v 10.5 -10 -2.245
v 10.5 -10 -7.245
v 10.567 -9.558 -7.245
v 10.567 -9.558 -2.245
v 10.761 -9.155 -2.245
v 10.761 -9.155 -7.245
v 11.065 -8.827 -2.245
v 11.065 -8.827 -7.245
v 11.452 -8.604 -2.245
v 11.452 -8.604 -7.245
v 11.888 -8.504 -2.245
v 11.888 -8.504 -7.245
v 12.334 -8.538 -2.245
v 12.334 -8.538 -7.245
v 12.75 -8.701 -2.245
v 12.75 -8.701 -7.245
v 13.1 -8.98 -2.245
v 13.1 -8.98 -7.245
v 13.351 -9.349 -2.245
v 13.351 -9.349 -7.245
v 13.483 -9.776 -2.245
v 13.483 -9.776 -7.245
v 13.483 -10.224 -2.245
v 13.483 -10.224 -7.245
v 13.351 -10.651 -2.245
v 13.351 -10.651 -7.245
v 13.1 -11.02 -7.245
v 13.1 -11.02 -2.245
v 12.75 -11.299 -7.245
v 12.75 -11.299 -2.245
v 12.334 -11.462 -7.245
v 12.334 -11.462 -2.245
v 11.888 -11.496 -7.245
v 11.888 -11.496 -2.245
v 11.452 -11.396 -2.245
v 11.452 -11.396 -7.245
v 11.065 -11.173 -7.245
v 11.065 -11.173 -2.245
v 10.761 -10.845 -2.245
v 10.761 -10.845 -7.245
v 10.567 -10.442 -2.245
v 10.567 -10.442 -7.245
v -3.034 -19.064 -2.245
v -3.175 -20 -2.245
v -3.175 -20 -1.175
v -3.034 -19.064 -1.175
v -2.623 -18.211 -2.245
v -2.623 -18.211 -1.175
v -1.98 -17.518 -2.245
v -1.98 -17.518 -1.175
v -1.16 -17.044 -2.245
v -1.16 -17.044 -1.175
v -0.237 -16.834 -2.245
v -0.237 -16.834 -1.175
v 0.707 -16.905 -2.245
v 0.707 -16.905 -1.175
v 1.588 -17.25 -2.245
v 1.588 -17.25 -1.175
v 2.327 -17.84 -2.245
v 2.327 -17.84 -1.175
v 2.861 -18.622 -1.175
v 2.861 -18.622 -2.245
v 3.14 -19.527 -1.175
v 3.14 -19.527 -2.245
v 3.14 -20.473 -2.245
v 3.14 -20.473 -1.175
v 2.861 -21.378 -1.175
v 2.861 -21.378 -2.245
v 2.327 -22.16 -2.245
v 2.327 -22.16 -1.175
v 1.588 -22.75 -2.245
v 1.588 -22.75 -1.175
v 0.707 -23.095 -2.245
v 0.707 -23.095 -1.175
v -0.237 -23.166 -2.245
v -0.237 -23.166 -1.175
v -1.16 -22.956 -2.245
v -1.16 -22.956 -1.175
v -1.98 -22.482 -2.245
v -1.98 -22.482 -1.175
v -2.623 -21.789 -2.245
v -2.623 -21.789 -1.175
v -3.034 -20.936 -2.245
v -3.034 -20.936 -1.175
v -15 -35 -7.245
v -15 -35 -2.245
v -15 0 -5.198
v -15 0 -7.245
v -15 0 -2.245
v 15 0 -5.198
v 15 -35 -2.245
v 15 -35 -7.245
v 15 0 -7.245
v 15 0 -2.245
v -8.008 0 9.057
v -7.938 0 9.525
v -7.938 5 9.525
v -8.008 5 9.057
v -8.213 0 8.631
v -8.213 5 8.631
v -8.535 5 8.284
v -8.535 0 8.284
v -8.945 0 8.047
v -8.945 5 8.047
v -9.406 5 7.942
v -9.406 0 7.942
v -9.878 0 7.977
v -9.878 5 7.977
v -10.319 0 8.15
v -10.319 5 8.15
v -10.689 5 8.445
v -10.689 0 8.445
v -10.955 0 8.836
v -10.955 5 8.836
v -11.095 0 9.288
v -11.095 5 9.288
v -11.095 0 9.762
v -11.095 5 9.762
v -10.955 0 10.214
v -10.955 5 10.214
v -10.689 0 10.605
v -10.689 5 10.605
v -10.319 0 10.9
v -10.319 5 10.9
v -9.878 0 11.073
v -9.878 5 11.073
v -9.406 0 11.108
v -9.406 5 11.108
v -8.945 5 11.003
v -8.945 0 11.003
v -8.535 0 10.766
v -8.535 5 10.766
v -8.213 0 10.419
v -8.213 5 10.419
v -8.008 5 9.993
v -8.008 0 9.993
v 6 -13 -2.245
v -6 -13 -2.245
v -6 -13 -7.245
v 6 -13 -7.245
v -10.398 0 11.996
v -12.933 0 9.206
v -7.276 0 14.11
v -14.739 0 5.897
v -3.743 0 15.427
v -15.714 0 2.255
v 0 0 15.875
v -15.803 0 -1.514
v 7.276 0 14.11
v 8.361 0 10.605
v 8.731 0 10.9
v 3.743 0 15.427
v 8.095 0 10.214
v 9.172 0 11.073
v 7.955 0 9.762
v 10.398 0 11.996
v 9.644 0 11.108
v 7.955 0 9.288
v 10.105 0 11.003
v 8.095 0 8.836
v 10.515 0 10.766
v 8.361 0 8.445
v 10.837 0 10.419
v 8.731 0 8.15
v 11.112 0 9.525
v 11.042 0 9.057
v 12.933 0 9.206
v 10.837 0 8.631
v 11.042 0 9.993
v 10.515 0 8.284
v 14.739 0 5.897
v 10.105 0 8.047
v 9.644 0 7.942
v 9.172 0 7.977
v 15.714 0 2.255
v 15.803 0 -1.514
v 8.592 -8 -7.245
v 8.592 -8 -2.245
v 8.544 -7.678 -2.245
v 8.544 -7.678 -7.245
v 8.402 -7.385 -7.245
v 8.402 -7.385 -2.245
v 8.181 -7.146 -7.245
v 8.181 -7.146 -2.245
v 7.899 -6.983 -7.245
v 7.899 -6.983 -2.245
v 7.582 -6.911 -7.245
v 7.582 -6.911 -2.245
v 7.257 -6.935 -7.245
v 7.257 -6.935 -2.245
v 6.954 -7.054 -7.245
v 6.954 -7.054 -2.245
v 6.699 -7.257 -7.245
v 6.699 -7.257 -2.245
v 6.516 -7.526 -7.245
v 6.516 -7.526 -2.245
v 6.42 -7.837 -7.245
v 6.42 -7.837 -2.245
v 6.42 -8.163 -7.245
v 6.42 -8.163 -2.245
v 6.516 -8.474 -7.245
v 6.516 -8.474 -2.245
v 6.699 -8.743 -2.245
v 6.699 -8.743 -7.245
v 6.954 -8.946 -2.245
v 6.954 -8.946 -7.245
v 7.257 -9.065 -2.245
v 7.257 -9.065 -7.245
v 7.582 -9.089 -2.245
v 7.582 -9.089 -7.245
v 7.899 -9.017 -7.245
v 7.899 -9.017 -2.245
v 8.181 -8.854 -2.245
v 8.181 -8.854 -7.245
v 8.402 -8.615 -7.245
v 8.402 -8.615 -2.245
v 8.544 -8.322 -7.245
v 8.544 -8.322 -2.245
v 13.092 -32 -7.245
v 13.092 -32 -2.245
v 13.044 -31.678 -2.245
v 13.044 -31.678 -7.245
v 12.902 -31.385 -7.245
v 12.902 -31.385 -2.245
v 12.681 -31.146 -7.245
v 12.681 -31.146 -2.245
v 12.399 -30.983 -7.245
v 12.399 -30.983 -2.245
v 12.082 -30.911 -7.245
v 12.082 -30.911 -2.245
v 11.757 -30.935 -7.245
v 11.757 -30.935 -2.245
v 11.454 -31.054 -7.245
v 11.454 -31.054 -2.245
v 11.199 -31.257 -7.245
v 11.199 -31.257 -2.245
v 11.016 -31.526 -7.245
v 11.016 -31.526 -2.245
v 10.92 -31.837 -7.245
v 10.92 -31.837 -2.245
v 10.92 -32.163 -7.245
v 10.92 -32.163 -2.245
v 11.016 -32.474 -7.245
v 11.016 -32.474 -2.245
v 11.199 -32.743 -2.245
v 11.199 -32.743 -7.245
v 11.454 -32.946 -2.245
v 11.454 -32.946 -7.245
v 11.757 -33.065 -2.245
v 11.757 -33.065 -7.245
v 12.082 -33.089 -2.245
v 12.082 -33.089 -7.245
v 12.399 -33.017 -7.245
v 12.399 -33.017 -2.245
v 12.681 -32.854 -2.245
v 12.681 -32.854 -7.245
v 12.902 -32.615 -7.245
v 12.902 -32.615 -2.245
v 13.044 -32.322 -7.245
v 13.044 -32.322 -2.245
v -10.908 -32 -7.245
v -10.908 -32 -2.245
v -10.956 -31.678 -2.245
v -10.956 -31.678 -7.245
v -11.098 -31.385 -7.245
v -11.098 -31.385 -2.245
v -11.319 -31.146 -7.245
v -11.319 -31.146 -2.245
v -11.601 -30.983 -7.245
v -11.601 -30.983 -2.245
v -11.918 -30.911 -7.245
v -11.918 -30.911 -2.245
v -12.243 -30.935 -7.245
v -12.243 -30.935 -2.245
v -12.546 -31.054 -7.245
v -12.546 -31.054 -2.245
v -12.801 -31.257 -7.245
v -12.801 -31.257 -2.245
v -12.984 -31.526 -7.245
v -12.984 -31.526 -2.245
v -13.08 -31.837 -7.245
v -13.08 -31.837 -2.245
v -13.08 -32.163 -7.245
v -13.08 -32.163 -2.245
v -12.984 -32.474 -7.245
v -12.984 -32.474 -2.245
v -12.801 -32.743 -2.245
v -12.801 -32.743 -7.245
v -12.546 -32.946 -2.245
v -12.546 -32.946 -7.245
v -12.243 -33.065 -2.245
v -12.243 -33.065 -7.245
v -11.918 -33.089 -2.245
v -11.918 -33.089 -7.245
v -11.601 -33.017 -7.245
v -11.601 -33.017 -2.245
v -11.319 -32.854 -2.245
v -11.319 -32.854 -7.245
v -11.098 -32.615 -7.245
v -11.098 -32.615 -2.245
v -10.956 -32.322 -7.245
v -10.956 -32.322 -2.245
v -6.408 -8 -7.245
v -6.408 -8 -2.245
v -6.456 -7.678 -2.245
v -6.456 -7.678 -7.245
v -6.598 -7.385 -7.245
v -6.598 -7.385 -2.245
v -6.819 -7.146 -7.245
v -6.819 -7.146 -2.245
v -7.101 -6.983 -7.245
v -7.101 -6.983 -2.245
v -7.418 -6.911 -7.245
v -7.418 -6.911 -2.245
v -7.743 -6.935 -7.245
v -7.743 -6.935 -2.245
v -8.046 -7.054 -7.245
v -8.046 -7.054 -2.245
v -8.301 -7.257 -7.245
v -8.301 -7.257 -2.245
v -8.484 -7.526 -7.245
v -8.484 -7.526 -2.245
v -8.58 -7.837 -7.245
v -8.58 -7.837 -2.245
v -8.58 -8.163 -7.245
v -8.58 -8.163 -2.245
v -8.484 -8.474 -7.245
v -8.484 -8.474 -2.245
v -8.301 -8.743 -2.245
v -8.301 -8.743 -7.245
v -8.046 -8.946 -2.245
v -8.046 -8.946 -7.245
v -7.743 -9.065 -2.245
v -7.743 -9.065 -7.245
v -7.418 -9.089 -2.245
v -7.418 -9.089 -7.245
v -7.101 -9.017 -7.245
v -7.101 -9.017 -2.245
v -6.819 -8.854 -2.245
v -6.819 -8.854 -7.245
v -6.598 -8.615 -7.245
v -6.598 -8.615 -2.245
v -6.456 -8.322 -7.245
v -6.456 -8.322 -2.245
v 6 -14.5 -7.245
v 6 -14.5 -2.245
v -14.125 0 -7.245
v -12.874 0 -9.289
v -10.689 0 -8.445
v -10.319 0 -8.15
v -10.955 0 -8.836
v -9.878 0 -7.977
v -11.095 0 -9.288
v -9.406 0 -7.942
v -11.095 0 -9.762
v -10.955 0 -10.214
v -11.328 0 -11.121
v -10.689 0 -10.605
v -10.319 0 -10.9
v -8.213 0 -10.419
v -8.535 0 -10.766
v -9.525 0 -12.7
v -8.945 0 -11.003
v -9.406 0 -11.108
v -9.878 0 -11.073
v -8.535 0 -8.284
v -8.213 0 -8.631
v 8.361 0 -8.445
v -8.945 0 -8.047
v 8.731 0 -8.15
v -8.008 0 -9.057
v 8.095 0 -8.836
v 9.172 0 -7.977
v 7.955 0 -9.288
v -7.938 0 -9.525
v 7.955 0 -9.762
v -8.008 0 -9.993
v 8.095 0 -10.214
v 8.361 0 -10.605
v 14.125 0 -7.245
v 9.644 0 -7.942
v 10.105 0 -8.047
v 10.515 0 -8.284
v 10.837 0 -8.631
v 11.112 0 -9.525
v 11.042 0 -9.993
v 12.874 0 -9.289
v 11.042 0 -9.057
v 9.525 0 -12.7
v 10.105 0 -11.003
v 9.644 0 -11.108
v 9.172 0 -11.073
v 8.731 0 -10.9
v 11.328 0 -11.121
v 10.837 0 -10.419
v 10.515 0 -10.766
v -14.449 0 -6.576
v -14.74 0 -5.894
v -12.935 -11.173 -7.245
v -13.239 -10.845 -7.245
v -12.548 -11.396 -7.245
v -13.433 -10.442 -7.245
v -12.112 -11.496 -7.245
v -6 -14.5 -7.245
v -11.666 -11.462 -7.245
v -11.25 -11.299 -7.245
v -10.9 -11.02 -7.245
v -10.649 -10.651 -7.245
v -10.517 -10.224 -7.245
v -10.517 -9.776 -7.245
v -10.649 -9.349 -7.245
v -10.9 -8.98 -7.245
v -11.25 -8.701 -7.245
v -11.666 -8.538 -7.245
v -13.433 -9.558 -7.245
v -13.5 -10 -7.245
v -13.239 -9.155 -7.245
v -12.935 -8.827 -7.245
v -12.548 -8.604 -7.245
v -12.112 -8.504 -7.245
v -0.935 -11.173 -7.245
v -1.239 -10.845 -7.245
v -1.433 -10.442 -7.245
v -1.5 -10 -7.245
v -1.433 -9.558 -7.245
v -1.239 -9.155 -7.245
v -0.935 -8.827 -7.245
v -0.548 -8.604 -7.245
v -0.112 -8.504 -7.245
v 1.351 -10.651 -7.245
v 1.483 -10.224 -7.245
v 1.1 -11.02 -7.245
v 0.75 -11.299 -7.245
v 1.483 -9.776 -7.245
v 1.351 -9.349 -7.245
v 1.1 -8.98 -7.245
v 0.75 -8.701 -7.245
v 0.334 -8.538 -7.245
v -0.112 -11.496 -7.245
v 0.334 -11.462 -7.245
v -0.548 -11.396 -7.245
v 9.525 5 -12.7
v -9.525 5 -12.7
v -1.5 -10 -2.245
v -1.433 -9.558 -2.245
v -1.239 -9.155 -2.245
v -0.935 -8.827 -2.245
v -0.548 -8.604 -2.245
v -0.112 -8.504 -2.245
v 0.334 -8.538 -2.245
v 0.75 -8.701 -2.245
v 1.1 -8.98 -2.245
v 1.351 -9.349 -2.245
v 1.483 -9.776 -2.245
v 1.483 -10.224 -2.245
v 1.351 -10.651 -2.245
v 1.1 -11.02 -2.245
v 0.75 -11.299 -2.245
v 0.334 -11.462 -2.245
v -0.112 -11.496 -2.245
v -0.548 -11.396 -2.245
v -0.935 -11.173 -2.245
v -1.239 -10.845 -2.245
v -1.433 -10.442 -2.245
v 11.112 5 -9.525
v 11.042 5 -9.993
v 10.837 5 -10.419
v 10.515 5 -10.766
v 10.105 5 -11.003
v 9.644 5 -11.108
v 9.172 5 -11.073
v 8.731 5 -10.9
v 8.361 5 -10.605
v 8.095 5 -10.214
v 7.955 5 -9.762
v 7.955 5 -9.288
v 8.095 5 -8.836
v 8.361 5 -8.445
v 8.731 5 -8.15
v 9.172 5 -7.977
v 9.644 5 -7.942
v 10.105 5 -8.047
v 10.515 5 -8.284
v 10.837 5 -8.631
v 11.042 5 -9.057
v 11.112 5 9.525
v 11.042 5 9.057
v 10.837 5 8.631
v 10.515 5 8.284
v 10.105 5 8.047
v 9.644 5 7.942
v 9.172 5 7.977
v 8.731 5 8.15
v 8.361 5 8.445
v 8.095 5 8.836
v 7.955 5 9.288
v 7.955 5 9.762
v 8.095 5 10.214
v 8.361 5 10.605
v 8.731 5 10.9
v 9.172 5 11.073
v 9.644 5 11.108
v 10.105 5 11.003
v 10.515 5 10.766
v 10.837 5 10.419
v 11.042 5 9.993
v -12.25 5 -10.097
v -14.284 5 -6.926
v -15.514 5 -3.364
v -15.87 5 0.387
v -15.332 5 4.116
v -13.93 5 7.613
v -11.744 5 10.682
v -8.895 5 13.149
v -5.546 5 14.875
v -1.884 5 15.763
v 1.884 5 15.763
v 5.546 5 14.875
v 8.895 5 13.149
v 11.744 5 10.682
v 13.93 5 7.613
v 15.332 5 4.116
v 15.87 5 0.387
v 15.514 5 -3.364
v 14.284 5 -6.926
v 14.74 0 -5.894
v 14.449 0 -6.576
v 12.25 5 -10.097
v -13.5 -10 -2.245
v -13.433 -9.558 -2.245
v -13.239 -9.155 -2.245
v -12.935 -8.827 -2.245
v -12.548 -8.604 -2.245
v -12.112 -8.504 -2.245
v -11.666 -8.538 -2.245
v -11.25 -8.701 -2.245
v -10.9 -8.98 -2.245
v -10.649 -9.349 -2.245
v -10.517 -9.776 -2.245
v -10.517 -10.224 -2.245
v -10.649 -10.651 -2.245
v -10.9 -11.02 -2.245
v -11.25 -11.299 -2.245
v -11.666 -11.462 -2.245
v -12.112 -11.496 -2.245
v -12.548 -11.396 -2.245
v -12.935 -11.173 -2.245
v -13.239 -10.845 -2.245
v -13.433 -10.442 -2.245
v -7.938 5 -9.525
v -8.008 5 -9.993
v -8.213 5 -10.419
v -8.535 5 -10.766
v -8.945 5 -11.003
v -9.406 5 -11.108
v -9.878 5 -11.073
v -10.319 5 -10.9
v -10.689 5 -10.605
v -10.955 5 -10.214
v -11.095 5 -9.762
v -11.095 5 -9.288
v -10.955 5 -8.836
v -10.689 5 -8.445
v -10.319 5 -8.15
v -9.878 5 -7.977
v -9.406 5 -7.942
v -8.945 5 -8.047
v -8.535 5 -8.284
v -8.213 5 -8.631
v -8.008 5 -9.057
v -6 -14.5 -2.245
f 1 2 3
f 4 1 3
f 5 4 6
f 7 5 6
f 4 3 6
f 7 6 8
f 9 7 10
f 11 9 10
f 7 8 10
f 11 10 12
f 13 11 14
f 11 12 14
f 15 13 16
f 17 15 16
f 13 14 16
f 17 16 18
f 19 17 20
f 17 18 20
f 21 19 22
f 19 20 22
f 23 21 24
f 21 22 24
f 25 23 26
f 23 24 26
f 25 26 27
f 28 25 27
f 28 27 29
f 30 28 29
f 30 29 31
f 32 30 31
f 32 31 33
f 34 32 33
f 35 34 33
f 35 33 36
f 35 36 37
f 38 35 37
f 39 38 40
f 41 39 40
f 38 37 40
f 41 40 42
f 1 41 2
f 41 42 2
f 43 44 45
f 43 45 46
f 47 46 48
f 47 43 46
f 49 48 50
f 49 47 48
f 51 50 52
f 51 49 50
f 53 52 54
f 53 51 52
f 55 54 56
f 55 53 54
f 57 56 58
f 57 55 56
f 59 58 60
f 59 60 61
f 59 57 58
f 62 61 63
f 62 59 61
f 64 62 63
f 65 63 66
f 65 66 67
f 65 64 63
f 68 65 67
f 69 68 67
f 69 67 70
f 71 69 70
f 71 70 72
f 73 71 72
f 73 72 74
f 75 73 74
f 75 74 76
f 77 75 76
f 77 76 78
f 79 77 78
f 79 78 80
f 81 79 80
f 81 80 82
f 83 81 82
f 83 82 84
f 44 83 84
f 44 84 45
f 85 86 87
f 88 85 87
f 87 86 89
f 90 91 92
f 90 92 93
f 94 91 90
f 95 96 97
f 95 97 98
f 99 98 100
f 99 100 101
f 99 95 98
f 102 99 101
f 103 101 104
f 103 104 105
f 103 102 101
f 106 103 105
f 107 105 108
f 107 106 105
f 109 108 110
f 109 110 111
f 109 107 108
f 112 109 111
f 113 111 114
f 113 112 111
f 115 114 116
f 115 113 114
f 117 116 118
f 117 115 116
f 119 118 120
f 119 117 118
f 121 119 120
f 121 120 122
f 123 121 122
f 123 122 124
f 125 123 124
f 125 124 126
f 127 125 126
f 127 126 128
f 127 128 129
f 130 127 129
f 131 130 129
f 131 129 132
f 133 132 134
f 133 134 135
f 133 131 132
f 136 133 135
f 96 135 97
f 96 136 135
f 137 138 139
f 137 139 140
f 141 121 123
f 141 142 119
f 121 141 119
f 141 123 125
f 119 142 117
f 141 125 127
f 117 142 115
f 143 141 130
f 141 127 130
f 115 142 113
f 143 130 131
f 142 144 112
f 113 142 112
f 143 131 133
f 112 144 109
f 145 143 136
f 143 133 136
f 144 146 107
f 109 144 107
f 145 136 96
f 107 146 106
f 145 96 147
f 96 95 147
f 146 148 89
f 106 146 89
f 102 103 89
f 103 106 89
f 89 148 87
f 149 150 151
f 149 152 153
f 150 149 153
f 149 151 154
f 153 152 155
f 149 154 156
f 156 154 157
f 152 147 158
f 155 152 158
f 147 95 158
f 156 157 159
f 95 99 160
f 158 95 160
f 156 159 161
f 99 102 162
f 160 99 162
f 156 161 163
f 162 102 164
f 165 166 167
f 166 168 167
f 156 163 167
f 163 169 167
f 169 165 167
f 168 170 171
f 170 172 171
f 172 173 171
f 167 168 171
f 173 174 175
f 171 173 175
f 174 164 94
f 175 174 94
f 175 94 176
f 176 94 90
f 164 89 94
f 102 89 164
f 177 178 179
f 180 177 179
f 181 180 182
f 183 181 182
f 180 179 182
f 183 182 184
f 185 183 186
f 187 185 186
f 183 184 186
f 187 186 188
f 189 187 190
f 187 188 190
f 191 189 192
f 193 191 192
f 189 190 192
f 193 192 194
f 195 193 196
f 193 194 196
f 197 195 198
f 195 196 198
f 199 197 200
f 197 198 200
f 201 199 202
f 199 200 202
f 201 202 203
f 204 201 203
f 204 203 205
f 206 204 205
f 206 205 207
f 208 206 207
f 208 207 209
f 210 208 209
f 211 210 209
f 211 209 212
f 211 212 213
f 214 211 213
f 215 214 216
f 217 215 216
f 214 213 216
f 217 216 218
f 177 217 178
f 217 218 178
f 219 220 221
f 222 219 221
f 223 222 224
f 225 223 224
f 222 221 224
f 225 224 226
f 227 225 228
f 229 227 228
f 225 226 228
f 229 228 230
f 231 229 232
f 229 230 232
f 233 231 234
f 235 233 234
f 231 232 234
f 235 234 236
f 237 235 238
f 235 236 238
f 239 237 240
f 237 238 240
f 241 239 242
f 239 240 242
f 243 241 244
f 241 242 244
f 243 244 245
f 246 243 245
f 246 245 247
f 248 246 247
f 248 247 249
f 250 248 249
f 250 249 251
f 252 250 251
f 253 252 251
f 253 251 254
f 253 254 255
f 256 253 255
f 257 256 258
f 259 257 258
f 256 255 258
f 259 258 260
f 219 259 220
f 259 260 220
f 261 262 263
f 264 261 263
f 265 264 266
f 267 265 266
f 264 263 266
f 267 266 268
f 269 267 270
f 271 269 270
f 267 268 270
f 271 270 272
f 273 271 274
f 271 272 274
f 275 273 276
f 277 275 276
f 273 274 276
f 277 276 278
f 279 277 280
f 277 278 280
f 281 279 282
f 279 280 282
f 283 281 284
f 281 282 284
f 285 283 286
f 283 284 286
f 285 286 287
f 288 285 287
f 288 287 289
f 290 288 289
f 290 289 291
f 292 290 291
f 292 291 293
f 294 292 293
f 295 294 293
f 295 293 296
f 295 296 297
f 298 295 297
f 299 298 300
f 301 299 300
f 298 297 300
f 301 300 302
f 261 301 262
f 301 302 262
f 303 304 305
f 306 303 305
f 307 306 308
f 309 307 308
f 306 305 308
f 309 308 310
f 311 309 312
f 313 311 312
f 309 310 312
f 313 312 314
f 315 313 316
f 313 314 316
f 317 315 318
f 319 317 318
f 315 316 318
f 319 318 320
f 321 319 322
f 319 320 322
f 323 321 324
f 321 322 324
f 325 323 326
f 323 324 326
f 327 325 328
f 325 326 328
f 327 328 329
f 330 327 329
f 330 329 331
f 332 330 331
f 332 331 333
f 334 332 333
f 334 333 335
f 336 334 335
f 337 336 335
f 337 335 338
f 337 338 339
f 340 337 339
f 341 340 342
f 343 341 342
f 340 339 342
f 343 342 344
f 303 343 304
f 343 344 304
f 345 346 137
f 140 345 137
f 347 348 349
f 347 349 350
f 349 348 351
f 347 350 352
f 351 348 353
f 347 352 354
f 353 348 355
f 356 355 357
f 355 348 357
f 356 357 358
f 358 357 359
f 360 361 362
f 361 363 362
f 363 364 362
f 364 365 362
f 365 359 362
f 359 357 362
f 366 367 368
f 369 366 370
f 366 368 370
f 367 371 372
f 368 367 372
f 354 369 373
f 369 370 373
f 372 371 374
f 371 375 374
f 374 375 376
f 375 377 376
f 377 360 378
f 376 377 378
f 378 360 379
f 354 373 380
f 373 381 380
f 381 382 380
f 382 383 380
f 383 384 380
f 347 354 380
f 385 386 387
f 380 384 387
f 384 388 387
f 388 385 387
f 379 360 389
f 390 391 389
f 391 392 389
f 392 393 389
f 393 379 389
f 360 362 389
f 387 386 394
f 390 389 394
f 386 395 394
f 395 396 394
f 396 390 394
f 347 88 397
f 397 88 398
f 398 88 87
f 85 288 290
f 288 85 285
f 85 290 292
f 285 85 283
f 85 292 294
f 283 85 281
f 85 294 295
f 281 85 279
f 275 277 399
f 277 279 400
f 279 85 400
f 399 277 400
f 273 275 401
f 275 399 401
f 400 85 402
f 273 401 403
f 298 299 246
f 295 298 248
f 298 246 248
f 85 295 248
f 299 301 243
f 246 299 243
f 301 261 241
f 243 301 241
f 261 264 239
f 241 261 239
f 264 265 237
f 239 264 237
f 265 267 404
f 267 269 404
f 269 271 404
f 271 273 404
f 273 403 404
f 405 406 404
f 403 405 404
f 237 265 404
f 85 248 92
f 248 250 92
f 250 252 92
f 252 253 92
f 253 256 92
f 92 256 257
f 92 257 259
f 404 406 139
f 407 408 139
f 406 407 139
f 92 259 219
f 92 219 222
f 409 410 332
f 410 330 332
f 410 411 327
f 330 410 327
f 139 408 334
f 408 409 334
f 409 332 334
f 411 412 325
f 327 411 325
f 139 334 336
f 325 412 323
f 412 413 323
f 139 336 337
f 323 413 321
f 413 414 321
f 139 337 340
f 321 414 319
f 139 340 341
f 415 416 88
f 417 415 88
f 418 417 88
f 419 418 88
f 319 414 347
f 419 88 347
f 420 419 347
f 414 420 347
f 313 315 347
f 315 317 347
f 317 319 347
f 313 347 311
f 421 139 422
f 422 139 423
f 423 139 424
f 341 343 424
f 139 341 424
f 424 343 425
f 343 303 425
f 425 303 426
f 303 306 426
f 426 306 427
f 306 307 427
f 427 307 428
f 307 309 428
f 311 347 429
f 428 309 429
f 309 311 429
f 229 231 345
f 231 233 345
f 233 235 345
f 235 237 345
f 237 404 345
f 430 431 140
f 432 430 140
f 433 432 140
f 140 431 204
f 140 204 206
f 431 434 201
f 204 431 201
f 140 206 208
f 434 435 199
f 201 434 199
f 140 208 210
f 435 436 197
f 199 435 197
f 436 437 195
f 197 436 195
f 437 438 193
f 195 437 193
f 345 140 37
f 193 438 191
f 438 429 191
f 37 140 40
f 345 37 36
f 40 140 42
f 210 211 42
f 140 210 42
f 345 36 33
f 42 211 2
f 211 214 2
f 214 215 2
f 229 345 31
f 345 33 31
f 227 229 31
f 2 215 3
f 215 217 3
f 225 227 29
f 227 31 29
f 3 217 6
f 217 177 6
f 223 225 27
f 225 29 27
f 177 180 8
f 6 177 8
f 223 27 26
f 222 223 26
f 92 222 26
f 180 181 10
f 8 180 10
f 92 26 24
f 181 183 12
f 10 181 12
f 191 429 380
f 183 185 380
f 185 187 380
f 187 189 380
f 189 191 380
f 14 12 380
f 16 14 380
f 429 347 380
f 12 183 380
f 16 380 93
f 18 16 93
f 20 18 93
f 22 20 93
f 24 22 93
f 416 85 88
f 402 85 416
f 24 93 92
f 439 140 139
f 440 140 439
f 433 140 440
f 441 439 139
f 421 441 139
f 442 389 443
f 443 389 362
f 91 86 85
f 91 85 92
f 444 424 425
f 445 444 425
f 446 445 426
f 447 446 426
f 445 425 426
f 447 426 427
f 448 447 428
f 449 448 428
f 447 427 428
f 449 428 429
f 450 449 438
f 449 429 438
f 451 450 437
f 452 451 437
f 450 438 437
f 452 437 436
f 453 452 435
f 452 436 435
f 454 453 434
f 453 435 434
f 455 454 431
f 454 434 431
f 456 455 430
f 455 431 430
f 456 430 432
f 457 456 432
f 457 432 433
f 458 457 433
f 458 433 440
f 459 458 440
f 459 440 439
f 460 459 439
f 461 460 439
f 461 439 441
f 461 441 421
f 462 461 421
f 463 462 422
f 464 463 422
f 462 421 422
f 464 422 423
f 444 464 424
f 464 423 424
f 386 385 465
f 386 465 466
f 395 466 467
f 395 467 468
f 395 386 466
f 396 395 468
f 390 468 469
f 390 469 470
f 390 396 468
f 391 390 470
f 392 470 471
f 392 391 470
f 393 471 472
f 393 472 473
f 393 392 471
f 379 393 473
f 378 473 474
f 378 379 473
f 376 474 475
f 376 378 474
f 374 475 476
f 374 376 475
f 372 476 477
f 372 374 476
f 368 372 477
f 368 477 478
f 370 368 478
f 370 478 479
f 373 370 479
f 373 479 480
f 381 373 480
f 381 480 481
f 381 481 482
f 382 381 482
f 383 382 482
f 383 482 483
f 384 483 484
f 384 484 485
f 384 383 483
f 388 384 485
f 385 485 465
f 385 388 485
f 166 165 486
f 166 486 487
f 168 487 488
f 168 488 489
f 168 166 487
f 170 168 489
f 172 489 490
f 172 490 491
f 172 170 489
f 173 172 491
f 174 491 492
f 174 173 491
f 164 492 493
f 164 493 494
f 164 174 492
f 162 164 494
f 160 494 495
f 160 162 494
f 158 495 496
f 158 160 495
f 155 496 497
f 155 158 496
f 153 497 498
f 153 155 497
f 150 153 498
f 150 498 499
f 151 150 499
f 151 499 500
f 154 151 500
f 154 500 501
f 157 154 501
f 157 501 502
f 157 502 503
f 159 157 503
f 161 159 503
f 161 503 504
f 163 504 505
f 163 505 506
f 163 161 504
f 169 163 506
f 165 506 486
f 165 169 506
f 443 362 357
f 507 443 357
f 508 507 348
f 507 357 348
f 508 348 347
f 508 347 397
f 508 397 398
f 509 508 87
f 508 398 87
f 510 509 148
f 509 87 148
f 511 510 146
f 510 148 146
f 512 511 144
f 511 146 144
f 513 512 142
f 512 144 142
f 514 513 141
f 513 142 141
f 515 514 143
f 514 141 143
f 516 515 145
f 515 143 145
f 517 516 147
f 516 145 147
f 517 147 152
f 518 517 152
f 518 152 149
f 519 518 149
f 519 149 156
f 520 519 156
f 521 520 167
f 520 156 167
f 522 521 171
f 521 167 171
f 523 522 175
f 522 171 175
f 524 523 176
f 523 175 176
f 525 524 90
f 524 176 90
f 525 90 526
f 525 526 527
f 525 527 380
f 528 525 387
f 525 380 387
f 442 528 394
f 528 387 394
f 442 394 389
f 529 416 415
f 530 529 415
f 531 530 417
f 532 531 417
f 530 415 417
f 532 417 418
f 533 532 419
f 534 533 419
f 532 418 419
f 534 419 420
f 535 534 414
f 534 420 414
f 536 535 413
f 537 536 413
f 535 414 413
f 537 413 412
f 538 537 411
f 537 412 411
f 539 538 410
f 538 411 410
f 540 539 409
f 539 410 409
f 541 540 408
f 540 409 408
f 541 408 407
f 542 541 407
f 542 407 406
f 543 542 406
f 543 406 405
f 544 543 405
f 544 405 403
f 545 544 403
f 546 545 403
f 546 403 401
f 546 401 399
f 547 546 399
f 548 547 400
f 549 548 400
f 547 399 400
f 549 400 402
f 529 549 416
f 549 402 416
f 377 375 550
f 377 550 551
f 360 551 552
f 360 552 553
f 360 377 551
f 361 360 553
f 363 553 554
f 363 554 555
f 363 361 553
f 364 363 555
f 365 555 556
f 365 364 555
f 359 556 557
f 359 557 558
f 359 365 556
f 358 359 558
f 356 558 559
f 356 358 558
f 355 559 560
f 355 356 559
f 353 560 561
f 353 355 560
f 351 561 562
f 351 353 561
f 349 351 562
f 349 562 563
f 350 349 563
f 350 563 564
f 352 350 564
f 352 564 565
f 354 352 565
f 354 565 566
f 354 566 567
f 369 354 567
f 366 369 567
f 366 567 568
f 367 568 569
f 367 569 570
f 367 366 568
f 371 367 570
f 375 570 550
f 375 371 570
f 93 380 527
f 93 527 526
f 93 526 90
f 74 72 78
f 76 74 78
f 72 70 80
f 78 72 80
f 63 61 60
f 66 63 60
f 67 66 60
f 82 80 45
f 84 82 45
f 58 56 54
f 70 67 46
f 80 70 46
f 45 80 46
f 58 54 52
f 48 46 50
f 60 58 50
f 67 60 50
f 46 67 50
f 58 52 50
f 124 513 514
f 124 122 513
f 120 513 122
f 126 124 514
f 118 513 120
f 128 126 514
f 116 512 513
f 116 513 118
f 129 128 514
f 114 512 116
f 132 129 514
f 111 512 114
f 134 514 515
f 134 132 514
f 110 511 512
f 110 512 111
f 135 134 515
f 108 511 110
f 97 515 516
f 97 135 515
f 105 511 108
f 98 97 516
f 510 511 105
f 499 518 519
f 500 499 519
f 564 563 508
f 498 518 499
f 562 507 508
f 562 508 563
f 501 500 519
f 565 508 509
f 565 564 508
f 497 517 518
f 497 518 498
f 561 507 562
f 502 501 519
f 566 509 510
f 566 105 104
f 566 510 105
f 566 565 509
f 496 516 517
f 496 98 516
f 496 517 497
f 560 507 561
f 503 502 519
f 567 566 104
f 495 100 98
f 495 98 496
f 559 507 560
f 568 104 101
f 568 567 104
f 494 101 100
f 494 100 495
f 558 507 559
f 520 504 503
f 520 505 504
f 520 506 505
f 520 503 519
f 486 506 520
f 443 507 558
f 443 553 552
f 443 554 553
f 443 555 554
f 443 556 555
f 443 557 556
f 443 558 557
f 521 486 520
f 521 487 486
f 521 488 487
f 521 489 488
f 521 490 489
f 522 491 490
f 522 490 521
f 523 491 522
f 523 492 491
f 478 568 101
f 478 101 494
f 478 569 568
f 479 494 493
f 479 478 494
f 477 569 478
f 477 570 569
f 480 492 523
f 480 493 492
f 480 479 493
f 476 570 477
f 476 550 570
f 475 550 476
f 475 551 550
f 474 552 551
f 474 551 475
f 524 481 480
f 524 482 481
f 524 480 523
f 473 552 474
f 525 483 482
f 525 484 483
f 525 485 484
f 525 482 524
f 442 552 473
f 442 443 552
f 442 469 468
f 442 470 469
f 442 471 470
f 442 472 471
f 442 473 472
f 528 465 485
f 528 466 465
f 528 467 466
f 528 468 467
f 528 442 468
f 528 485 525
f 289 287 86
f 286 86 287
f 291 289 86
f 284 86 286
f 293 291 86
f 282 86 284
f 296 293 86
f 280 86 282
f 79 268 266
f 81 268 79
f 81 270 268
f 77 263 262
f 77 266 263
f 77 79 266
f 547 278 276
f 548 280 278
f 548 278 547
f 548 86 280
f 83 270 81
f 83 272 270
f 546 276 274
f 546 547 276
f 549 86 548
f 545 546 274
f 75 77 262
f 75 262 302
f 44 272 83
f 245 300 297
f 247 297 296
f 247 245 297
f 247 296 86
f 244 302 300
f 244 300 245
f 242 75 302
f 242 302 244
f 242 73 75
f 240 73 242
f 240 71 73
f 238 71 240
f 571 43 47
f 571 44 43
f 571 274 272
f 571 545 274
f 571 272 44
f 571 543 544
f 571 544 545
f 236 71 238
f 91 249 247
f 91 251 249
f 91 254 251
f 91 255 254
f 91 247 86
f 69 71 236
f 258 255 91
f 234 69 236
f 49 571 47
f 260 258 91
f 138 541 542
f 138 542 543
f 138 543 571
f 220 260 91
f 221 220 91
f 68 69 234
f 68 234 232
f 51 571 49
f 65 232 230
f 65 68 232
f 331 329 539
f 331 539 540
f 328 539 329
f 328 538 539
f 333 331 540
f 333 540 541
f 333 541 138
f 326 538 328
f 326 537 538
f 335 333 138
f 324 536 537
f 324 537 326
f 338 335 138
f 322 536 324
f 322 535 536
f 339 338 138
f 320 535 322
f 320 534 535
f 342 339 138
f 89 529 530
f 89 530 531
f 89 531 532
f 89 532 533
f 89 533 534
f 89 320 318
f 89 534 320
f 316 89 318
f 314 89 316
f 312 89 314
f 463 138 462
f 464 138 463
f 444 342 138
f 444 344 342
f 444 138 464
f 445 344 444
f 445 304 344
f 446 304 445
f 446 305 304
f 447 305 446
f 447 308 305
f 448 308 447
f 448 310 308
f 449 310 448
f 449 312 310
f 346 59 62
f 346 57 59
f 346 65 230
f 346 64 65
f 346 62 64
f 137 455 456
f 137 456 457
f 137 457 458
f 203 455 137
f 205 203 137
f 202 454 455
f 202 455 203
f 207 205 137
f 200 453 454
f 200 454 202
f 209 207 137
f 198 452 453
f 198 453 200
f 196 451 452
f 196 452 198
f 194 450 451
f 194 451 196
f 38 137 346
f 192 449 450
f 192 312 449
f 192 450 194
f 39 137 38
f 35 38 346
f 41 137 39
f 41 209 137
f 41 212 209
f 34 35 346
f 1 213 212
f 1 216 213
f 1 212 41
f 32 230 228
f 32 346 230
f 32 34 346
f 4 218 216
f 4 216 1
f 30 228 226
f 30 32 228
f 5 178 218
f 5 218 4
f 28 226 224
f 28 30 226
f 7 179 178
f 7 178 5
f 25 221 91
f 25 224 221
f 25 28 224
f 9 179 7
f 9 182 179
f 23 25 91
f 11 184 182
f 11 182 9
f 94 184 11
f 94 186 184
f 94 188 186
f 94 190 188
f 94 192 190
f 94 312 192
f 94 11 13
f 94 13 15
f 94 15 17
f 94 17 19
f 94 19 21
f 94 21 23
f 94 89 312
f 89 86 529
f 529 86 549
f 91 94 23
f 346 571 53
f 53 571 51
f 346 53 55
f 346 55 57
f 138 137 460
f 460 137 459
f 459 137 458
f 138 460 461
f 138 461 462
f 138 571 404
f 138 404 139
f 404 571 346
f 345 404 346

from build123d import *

# Parameters (mm, degrees)
SKETCH1_R            = 1.5875
BOSS_EXTRUDE3_DEPTH  = 5
SKETCH2_R            = 1.5875
BOSS_EXTRUDE4_DEPTH  = 5
BOSS_EXTRUDE9_START  = -2.245
SKETCH3_W            = 30
SKETCH3_H            = 35
SKETCH3_R            = 1.0922
SKETCH3_R_2          = 3.175
SKETCH3_W_2          = 12
SKETCH3_H_2          = 1.5
BOSS_EXTRUDE9_DEPTH  = 5
SKETCH11_R           = 3.175
BOSS_EXTRUDE10_DEPTH = 6.07
SKETCH12_R           = 1.5
CUT_EXTRUDE2_DEPTH   = 5


with BuildPart() as part:
    # Sketch1 → Boss-Extrude3 (new body)
    with BuildSketch(Plane(origin=(0, 0, 0), x_dir=(1, 0, 0), z_dir=(0, 1, 0))):
        with BuildLine():
            Line((9.525, 12.7), (-9.525, 12.7))
            ThreePointArc((-9.525, 12.7), (0, -15.875), (9.525, 12.7))
        make_face()
        with Locations((-12.7, 0)):
            Circle(SKETCH1_R, mode=Mode.SUBTRACT)
        with Locations((12.7, 0)):
            Circle(SKETCH1_R, mode=Mode.SUBTRACT)
        with Locations((0, -12.7)):
            Circle(SKETCH1_R, mode=Mode.SUBTRACT)
        with Locations((9.525, 9.525)):
            Circle(SKETCH1_R, mode=Mode.SUBTRACT)
        with Locations((-9.525, 9.525)):
            Circle(SKETCH1_R, mode=Mode.SUBTRACT)
        with Locations((-9.525, -9.525)):
            Circle(SKETCH1_R, mode=Mode.SUBTRACT)
        with Locations((9.525, -9.525)):
            Circle(SKETCH1_R, mode=Mode.SUBTRACT)
    extrude(amount=BOSS_EXTRUDE3_DEPTH)

    # Sketch2 → Boss-Extrude4 (add)
    with BuildSketch(Plane(origin=(0, 0, 0), x_dir=(1, 0, 0), z_dir=(0, 1, 0))):
        with Locations((-12.7, 0)):
            Circle(SKETCH2_R)
        with Locations((0, -12.7)):
            Circle(SKETCH2_R)
        with Locations((12.7, 0)):
            Circle(SKETCH2_R)
    extrude(amount=BOSS_EXTRUDE4_DEPTH)

    # Sketch3 → Boss-Extrude9 (add)
    with BuildSketch(Plane.XY.offset(BOSS_EXTRUDE9_START)):
        with Locations((0, -17.5)):
            Rectangle(SKETCH3_W, SKETCH3_H)
        with Locations((-7.5, -8)):
            Circle(SKETCH3_R, mode=Mode.SUBTRACT)
        with Locations((7.5, -8)):
            Circle(SKETCH3_R, mode=Mode.SUBTRACT)
        with Locations((0, -20)):
            Circle(SKETCH3_R_2, mode=Mode.SUBTRACT)
        with Locations((-12, -32)):
            Circle(SKETCH3_R, mode=Mode.SUBTRACT)
        with Locations((12, -32)):
            Circle(SKETCH3_R, mode=Mode.SUBTRACT)
        with Locations((0, -13.75)):
            Rectangle(SKETCH3_W_2, SKETCH3_H_2, mode=Mode.SUBTRACT)
    extrude(amount=-BOSS_EXTRUDE9_DEPTH)

    # Sketch11 → Boss-Extrude10 (add)
    with BuildSketch(Plane(origin=(0, 0, -7.245), x_dir=(-1, 0, 0), z_dir=(0, 0, -1))):
        with Locations((0, -20)):
            Circle(SKETCH11_R)
    extrude(amount=-BOSS_EXTRUDE10_DEPTH)

    # Sketch12 → Cut-Extrude2 (cut)
    with BuildSketch(Plane(origin=(0, 0, -7.245), x_dir=(-1, 0, 0), z_dir=(0, 0, -1))):
        with Locations((-12, -10)):
            Circle(SKETCH12_R)
        with Locations((0, -10)):
            Circle(SKETCH12_R)
        with Locations((12, -10)):
            Circle(SKETCH12_R)
    extrude(amount=-CUT_EXTRUDE2_DEPTH, mode=Mode.SUBTRACT)


solid = part.part
